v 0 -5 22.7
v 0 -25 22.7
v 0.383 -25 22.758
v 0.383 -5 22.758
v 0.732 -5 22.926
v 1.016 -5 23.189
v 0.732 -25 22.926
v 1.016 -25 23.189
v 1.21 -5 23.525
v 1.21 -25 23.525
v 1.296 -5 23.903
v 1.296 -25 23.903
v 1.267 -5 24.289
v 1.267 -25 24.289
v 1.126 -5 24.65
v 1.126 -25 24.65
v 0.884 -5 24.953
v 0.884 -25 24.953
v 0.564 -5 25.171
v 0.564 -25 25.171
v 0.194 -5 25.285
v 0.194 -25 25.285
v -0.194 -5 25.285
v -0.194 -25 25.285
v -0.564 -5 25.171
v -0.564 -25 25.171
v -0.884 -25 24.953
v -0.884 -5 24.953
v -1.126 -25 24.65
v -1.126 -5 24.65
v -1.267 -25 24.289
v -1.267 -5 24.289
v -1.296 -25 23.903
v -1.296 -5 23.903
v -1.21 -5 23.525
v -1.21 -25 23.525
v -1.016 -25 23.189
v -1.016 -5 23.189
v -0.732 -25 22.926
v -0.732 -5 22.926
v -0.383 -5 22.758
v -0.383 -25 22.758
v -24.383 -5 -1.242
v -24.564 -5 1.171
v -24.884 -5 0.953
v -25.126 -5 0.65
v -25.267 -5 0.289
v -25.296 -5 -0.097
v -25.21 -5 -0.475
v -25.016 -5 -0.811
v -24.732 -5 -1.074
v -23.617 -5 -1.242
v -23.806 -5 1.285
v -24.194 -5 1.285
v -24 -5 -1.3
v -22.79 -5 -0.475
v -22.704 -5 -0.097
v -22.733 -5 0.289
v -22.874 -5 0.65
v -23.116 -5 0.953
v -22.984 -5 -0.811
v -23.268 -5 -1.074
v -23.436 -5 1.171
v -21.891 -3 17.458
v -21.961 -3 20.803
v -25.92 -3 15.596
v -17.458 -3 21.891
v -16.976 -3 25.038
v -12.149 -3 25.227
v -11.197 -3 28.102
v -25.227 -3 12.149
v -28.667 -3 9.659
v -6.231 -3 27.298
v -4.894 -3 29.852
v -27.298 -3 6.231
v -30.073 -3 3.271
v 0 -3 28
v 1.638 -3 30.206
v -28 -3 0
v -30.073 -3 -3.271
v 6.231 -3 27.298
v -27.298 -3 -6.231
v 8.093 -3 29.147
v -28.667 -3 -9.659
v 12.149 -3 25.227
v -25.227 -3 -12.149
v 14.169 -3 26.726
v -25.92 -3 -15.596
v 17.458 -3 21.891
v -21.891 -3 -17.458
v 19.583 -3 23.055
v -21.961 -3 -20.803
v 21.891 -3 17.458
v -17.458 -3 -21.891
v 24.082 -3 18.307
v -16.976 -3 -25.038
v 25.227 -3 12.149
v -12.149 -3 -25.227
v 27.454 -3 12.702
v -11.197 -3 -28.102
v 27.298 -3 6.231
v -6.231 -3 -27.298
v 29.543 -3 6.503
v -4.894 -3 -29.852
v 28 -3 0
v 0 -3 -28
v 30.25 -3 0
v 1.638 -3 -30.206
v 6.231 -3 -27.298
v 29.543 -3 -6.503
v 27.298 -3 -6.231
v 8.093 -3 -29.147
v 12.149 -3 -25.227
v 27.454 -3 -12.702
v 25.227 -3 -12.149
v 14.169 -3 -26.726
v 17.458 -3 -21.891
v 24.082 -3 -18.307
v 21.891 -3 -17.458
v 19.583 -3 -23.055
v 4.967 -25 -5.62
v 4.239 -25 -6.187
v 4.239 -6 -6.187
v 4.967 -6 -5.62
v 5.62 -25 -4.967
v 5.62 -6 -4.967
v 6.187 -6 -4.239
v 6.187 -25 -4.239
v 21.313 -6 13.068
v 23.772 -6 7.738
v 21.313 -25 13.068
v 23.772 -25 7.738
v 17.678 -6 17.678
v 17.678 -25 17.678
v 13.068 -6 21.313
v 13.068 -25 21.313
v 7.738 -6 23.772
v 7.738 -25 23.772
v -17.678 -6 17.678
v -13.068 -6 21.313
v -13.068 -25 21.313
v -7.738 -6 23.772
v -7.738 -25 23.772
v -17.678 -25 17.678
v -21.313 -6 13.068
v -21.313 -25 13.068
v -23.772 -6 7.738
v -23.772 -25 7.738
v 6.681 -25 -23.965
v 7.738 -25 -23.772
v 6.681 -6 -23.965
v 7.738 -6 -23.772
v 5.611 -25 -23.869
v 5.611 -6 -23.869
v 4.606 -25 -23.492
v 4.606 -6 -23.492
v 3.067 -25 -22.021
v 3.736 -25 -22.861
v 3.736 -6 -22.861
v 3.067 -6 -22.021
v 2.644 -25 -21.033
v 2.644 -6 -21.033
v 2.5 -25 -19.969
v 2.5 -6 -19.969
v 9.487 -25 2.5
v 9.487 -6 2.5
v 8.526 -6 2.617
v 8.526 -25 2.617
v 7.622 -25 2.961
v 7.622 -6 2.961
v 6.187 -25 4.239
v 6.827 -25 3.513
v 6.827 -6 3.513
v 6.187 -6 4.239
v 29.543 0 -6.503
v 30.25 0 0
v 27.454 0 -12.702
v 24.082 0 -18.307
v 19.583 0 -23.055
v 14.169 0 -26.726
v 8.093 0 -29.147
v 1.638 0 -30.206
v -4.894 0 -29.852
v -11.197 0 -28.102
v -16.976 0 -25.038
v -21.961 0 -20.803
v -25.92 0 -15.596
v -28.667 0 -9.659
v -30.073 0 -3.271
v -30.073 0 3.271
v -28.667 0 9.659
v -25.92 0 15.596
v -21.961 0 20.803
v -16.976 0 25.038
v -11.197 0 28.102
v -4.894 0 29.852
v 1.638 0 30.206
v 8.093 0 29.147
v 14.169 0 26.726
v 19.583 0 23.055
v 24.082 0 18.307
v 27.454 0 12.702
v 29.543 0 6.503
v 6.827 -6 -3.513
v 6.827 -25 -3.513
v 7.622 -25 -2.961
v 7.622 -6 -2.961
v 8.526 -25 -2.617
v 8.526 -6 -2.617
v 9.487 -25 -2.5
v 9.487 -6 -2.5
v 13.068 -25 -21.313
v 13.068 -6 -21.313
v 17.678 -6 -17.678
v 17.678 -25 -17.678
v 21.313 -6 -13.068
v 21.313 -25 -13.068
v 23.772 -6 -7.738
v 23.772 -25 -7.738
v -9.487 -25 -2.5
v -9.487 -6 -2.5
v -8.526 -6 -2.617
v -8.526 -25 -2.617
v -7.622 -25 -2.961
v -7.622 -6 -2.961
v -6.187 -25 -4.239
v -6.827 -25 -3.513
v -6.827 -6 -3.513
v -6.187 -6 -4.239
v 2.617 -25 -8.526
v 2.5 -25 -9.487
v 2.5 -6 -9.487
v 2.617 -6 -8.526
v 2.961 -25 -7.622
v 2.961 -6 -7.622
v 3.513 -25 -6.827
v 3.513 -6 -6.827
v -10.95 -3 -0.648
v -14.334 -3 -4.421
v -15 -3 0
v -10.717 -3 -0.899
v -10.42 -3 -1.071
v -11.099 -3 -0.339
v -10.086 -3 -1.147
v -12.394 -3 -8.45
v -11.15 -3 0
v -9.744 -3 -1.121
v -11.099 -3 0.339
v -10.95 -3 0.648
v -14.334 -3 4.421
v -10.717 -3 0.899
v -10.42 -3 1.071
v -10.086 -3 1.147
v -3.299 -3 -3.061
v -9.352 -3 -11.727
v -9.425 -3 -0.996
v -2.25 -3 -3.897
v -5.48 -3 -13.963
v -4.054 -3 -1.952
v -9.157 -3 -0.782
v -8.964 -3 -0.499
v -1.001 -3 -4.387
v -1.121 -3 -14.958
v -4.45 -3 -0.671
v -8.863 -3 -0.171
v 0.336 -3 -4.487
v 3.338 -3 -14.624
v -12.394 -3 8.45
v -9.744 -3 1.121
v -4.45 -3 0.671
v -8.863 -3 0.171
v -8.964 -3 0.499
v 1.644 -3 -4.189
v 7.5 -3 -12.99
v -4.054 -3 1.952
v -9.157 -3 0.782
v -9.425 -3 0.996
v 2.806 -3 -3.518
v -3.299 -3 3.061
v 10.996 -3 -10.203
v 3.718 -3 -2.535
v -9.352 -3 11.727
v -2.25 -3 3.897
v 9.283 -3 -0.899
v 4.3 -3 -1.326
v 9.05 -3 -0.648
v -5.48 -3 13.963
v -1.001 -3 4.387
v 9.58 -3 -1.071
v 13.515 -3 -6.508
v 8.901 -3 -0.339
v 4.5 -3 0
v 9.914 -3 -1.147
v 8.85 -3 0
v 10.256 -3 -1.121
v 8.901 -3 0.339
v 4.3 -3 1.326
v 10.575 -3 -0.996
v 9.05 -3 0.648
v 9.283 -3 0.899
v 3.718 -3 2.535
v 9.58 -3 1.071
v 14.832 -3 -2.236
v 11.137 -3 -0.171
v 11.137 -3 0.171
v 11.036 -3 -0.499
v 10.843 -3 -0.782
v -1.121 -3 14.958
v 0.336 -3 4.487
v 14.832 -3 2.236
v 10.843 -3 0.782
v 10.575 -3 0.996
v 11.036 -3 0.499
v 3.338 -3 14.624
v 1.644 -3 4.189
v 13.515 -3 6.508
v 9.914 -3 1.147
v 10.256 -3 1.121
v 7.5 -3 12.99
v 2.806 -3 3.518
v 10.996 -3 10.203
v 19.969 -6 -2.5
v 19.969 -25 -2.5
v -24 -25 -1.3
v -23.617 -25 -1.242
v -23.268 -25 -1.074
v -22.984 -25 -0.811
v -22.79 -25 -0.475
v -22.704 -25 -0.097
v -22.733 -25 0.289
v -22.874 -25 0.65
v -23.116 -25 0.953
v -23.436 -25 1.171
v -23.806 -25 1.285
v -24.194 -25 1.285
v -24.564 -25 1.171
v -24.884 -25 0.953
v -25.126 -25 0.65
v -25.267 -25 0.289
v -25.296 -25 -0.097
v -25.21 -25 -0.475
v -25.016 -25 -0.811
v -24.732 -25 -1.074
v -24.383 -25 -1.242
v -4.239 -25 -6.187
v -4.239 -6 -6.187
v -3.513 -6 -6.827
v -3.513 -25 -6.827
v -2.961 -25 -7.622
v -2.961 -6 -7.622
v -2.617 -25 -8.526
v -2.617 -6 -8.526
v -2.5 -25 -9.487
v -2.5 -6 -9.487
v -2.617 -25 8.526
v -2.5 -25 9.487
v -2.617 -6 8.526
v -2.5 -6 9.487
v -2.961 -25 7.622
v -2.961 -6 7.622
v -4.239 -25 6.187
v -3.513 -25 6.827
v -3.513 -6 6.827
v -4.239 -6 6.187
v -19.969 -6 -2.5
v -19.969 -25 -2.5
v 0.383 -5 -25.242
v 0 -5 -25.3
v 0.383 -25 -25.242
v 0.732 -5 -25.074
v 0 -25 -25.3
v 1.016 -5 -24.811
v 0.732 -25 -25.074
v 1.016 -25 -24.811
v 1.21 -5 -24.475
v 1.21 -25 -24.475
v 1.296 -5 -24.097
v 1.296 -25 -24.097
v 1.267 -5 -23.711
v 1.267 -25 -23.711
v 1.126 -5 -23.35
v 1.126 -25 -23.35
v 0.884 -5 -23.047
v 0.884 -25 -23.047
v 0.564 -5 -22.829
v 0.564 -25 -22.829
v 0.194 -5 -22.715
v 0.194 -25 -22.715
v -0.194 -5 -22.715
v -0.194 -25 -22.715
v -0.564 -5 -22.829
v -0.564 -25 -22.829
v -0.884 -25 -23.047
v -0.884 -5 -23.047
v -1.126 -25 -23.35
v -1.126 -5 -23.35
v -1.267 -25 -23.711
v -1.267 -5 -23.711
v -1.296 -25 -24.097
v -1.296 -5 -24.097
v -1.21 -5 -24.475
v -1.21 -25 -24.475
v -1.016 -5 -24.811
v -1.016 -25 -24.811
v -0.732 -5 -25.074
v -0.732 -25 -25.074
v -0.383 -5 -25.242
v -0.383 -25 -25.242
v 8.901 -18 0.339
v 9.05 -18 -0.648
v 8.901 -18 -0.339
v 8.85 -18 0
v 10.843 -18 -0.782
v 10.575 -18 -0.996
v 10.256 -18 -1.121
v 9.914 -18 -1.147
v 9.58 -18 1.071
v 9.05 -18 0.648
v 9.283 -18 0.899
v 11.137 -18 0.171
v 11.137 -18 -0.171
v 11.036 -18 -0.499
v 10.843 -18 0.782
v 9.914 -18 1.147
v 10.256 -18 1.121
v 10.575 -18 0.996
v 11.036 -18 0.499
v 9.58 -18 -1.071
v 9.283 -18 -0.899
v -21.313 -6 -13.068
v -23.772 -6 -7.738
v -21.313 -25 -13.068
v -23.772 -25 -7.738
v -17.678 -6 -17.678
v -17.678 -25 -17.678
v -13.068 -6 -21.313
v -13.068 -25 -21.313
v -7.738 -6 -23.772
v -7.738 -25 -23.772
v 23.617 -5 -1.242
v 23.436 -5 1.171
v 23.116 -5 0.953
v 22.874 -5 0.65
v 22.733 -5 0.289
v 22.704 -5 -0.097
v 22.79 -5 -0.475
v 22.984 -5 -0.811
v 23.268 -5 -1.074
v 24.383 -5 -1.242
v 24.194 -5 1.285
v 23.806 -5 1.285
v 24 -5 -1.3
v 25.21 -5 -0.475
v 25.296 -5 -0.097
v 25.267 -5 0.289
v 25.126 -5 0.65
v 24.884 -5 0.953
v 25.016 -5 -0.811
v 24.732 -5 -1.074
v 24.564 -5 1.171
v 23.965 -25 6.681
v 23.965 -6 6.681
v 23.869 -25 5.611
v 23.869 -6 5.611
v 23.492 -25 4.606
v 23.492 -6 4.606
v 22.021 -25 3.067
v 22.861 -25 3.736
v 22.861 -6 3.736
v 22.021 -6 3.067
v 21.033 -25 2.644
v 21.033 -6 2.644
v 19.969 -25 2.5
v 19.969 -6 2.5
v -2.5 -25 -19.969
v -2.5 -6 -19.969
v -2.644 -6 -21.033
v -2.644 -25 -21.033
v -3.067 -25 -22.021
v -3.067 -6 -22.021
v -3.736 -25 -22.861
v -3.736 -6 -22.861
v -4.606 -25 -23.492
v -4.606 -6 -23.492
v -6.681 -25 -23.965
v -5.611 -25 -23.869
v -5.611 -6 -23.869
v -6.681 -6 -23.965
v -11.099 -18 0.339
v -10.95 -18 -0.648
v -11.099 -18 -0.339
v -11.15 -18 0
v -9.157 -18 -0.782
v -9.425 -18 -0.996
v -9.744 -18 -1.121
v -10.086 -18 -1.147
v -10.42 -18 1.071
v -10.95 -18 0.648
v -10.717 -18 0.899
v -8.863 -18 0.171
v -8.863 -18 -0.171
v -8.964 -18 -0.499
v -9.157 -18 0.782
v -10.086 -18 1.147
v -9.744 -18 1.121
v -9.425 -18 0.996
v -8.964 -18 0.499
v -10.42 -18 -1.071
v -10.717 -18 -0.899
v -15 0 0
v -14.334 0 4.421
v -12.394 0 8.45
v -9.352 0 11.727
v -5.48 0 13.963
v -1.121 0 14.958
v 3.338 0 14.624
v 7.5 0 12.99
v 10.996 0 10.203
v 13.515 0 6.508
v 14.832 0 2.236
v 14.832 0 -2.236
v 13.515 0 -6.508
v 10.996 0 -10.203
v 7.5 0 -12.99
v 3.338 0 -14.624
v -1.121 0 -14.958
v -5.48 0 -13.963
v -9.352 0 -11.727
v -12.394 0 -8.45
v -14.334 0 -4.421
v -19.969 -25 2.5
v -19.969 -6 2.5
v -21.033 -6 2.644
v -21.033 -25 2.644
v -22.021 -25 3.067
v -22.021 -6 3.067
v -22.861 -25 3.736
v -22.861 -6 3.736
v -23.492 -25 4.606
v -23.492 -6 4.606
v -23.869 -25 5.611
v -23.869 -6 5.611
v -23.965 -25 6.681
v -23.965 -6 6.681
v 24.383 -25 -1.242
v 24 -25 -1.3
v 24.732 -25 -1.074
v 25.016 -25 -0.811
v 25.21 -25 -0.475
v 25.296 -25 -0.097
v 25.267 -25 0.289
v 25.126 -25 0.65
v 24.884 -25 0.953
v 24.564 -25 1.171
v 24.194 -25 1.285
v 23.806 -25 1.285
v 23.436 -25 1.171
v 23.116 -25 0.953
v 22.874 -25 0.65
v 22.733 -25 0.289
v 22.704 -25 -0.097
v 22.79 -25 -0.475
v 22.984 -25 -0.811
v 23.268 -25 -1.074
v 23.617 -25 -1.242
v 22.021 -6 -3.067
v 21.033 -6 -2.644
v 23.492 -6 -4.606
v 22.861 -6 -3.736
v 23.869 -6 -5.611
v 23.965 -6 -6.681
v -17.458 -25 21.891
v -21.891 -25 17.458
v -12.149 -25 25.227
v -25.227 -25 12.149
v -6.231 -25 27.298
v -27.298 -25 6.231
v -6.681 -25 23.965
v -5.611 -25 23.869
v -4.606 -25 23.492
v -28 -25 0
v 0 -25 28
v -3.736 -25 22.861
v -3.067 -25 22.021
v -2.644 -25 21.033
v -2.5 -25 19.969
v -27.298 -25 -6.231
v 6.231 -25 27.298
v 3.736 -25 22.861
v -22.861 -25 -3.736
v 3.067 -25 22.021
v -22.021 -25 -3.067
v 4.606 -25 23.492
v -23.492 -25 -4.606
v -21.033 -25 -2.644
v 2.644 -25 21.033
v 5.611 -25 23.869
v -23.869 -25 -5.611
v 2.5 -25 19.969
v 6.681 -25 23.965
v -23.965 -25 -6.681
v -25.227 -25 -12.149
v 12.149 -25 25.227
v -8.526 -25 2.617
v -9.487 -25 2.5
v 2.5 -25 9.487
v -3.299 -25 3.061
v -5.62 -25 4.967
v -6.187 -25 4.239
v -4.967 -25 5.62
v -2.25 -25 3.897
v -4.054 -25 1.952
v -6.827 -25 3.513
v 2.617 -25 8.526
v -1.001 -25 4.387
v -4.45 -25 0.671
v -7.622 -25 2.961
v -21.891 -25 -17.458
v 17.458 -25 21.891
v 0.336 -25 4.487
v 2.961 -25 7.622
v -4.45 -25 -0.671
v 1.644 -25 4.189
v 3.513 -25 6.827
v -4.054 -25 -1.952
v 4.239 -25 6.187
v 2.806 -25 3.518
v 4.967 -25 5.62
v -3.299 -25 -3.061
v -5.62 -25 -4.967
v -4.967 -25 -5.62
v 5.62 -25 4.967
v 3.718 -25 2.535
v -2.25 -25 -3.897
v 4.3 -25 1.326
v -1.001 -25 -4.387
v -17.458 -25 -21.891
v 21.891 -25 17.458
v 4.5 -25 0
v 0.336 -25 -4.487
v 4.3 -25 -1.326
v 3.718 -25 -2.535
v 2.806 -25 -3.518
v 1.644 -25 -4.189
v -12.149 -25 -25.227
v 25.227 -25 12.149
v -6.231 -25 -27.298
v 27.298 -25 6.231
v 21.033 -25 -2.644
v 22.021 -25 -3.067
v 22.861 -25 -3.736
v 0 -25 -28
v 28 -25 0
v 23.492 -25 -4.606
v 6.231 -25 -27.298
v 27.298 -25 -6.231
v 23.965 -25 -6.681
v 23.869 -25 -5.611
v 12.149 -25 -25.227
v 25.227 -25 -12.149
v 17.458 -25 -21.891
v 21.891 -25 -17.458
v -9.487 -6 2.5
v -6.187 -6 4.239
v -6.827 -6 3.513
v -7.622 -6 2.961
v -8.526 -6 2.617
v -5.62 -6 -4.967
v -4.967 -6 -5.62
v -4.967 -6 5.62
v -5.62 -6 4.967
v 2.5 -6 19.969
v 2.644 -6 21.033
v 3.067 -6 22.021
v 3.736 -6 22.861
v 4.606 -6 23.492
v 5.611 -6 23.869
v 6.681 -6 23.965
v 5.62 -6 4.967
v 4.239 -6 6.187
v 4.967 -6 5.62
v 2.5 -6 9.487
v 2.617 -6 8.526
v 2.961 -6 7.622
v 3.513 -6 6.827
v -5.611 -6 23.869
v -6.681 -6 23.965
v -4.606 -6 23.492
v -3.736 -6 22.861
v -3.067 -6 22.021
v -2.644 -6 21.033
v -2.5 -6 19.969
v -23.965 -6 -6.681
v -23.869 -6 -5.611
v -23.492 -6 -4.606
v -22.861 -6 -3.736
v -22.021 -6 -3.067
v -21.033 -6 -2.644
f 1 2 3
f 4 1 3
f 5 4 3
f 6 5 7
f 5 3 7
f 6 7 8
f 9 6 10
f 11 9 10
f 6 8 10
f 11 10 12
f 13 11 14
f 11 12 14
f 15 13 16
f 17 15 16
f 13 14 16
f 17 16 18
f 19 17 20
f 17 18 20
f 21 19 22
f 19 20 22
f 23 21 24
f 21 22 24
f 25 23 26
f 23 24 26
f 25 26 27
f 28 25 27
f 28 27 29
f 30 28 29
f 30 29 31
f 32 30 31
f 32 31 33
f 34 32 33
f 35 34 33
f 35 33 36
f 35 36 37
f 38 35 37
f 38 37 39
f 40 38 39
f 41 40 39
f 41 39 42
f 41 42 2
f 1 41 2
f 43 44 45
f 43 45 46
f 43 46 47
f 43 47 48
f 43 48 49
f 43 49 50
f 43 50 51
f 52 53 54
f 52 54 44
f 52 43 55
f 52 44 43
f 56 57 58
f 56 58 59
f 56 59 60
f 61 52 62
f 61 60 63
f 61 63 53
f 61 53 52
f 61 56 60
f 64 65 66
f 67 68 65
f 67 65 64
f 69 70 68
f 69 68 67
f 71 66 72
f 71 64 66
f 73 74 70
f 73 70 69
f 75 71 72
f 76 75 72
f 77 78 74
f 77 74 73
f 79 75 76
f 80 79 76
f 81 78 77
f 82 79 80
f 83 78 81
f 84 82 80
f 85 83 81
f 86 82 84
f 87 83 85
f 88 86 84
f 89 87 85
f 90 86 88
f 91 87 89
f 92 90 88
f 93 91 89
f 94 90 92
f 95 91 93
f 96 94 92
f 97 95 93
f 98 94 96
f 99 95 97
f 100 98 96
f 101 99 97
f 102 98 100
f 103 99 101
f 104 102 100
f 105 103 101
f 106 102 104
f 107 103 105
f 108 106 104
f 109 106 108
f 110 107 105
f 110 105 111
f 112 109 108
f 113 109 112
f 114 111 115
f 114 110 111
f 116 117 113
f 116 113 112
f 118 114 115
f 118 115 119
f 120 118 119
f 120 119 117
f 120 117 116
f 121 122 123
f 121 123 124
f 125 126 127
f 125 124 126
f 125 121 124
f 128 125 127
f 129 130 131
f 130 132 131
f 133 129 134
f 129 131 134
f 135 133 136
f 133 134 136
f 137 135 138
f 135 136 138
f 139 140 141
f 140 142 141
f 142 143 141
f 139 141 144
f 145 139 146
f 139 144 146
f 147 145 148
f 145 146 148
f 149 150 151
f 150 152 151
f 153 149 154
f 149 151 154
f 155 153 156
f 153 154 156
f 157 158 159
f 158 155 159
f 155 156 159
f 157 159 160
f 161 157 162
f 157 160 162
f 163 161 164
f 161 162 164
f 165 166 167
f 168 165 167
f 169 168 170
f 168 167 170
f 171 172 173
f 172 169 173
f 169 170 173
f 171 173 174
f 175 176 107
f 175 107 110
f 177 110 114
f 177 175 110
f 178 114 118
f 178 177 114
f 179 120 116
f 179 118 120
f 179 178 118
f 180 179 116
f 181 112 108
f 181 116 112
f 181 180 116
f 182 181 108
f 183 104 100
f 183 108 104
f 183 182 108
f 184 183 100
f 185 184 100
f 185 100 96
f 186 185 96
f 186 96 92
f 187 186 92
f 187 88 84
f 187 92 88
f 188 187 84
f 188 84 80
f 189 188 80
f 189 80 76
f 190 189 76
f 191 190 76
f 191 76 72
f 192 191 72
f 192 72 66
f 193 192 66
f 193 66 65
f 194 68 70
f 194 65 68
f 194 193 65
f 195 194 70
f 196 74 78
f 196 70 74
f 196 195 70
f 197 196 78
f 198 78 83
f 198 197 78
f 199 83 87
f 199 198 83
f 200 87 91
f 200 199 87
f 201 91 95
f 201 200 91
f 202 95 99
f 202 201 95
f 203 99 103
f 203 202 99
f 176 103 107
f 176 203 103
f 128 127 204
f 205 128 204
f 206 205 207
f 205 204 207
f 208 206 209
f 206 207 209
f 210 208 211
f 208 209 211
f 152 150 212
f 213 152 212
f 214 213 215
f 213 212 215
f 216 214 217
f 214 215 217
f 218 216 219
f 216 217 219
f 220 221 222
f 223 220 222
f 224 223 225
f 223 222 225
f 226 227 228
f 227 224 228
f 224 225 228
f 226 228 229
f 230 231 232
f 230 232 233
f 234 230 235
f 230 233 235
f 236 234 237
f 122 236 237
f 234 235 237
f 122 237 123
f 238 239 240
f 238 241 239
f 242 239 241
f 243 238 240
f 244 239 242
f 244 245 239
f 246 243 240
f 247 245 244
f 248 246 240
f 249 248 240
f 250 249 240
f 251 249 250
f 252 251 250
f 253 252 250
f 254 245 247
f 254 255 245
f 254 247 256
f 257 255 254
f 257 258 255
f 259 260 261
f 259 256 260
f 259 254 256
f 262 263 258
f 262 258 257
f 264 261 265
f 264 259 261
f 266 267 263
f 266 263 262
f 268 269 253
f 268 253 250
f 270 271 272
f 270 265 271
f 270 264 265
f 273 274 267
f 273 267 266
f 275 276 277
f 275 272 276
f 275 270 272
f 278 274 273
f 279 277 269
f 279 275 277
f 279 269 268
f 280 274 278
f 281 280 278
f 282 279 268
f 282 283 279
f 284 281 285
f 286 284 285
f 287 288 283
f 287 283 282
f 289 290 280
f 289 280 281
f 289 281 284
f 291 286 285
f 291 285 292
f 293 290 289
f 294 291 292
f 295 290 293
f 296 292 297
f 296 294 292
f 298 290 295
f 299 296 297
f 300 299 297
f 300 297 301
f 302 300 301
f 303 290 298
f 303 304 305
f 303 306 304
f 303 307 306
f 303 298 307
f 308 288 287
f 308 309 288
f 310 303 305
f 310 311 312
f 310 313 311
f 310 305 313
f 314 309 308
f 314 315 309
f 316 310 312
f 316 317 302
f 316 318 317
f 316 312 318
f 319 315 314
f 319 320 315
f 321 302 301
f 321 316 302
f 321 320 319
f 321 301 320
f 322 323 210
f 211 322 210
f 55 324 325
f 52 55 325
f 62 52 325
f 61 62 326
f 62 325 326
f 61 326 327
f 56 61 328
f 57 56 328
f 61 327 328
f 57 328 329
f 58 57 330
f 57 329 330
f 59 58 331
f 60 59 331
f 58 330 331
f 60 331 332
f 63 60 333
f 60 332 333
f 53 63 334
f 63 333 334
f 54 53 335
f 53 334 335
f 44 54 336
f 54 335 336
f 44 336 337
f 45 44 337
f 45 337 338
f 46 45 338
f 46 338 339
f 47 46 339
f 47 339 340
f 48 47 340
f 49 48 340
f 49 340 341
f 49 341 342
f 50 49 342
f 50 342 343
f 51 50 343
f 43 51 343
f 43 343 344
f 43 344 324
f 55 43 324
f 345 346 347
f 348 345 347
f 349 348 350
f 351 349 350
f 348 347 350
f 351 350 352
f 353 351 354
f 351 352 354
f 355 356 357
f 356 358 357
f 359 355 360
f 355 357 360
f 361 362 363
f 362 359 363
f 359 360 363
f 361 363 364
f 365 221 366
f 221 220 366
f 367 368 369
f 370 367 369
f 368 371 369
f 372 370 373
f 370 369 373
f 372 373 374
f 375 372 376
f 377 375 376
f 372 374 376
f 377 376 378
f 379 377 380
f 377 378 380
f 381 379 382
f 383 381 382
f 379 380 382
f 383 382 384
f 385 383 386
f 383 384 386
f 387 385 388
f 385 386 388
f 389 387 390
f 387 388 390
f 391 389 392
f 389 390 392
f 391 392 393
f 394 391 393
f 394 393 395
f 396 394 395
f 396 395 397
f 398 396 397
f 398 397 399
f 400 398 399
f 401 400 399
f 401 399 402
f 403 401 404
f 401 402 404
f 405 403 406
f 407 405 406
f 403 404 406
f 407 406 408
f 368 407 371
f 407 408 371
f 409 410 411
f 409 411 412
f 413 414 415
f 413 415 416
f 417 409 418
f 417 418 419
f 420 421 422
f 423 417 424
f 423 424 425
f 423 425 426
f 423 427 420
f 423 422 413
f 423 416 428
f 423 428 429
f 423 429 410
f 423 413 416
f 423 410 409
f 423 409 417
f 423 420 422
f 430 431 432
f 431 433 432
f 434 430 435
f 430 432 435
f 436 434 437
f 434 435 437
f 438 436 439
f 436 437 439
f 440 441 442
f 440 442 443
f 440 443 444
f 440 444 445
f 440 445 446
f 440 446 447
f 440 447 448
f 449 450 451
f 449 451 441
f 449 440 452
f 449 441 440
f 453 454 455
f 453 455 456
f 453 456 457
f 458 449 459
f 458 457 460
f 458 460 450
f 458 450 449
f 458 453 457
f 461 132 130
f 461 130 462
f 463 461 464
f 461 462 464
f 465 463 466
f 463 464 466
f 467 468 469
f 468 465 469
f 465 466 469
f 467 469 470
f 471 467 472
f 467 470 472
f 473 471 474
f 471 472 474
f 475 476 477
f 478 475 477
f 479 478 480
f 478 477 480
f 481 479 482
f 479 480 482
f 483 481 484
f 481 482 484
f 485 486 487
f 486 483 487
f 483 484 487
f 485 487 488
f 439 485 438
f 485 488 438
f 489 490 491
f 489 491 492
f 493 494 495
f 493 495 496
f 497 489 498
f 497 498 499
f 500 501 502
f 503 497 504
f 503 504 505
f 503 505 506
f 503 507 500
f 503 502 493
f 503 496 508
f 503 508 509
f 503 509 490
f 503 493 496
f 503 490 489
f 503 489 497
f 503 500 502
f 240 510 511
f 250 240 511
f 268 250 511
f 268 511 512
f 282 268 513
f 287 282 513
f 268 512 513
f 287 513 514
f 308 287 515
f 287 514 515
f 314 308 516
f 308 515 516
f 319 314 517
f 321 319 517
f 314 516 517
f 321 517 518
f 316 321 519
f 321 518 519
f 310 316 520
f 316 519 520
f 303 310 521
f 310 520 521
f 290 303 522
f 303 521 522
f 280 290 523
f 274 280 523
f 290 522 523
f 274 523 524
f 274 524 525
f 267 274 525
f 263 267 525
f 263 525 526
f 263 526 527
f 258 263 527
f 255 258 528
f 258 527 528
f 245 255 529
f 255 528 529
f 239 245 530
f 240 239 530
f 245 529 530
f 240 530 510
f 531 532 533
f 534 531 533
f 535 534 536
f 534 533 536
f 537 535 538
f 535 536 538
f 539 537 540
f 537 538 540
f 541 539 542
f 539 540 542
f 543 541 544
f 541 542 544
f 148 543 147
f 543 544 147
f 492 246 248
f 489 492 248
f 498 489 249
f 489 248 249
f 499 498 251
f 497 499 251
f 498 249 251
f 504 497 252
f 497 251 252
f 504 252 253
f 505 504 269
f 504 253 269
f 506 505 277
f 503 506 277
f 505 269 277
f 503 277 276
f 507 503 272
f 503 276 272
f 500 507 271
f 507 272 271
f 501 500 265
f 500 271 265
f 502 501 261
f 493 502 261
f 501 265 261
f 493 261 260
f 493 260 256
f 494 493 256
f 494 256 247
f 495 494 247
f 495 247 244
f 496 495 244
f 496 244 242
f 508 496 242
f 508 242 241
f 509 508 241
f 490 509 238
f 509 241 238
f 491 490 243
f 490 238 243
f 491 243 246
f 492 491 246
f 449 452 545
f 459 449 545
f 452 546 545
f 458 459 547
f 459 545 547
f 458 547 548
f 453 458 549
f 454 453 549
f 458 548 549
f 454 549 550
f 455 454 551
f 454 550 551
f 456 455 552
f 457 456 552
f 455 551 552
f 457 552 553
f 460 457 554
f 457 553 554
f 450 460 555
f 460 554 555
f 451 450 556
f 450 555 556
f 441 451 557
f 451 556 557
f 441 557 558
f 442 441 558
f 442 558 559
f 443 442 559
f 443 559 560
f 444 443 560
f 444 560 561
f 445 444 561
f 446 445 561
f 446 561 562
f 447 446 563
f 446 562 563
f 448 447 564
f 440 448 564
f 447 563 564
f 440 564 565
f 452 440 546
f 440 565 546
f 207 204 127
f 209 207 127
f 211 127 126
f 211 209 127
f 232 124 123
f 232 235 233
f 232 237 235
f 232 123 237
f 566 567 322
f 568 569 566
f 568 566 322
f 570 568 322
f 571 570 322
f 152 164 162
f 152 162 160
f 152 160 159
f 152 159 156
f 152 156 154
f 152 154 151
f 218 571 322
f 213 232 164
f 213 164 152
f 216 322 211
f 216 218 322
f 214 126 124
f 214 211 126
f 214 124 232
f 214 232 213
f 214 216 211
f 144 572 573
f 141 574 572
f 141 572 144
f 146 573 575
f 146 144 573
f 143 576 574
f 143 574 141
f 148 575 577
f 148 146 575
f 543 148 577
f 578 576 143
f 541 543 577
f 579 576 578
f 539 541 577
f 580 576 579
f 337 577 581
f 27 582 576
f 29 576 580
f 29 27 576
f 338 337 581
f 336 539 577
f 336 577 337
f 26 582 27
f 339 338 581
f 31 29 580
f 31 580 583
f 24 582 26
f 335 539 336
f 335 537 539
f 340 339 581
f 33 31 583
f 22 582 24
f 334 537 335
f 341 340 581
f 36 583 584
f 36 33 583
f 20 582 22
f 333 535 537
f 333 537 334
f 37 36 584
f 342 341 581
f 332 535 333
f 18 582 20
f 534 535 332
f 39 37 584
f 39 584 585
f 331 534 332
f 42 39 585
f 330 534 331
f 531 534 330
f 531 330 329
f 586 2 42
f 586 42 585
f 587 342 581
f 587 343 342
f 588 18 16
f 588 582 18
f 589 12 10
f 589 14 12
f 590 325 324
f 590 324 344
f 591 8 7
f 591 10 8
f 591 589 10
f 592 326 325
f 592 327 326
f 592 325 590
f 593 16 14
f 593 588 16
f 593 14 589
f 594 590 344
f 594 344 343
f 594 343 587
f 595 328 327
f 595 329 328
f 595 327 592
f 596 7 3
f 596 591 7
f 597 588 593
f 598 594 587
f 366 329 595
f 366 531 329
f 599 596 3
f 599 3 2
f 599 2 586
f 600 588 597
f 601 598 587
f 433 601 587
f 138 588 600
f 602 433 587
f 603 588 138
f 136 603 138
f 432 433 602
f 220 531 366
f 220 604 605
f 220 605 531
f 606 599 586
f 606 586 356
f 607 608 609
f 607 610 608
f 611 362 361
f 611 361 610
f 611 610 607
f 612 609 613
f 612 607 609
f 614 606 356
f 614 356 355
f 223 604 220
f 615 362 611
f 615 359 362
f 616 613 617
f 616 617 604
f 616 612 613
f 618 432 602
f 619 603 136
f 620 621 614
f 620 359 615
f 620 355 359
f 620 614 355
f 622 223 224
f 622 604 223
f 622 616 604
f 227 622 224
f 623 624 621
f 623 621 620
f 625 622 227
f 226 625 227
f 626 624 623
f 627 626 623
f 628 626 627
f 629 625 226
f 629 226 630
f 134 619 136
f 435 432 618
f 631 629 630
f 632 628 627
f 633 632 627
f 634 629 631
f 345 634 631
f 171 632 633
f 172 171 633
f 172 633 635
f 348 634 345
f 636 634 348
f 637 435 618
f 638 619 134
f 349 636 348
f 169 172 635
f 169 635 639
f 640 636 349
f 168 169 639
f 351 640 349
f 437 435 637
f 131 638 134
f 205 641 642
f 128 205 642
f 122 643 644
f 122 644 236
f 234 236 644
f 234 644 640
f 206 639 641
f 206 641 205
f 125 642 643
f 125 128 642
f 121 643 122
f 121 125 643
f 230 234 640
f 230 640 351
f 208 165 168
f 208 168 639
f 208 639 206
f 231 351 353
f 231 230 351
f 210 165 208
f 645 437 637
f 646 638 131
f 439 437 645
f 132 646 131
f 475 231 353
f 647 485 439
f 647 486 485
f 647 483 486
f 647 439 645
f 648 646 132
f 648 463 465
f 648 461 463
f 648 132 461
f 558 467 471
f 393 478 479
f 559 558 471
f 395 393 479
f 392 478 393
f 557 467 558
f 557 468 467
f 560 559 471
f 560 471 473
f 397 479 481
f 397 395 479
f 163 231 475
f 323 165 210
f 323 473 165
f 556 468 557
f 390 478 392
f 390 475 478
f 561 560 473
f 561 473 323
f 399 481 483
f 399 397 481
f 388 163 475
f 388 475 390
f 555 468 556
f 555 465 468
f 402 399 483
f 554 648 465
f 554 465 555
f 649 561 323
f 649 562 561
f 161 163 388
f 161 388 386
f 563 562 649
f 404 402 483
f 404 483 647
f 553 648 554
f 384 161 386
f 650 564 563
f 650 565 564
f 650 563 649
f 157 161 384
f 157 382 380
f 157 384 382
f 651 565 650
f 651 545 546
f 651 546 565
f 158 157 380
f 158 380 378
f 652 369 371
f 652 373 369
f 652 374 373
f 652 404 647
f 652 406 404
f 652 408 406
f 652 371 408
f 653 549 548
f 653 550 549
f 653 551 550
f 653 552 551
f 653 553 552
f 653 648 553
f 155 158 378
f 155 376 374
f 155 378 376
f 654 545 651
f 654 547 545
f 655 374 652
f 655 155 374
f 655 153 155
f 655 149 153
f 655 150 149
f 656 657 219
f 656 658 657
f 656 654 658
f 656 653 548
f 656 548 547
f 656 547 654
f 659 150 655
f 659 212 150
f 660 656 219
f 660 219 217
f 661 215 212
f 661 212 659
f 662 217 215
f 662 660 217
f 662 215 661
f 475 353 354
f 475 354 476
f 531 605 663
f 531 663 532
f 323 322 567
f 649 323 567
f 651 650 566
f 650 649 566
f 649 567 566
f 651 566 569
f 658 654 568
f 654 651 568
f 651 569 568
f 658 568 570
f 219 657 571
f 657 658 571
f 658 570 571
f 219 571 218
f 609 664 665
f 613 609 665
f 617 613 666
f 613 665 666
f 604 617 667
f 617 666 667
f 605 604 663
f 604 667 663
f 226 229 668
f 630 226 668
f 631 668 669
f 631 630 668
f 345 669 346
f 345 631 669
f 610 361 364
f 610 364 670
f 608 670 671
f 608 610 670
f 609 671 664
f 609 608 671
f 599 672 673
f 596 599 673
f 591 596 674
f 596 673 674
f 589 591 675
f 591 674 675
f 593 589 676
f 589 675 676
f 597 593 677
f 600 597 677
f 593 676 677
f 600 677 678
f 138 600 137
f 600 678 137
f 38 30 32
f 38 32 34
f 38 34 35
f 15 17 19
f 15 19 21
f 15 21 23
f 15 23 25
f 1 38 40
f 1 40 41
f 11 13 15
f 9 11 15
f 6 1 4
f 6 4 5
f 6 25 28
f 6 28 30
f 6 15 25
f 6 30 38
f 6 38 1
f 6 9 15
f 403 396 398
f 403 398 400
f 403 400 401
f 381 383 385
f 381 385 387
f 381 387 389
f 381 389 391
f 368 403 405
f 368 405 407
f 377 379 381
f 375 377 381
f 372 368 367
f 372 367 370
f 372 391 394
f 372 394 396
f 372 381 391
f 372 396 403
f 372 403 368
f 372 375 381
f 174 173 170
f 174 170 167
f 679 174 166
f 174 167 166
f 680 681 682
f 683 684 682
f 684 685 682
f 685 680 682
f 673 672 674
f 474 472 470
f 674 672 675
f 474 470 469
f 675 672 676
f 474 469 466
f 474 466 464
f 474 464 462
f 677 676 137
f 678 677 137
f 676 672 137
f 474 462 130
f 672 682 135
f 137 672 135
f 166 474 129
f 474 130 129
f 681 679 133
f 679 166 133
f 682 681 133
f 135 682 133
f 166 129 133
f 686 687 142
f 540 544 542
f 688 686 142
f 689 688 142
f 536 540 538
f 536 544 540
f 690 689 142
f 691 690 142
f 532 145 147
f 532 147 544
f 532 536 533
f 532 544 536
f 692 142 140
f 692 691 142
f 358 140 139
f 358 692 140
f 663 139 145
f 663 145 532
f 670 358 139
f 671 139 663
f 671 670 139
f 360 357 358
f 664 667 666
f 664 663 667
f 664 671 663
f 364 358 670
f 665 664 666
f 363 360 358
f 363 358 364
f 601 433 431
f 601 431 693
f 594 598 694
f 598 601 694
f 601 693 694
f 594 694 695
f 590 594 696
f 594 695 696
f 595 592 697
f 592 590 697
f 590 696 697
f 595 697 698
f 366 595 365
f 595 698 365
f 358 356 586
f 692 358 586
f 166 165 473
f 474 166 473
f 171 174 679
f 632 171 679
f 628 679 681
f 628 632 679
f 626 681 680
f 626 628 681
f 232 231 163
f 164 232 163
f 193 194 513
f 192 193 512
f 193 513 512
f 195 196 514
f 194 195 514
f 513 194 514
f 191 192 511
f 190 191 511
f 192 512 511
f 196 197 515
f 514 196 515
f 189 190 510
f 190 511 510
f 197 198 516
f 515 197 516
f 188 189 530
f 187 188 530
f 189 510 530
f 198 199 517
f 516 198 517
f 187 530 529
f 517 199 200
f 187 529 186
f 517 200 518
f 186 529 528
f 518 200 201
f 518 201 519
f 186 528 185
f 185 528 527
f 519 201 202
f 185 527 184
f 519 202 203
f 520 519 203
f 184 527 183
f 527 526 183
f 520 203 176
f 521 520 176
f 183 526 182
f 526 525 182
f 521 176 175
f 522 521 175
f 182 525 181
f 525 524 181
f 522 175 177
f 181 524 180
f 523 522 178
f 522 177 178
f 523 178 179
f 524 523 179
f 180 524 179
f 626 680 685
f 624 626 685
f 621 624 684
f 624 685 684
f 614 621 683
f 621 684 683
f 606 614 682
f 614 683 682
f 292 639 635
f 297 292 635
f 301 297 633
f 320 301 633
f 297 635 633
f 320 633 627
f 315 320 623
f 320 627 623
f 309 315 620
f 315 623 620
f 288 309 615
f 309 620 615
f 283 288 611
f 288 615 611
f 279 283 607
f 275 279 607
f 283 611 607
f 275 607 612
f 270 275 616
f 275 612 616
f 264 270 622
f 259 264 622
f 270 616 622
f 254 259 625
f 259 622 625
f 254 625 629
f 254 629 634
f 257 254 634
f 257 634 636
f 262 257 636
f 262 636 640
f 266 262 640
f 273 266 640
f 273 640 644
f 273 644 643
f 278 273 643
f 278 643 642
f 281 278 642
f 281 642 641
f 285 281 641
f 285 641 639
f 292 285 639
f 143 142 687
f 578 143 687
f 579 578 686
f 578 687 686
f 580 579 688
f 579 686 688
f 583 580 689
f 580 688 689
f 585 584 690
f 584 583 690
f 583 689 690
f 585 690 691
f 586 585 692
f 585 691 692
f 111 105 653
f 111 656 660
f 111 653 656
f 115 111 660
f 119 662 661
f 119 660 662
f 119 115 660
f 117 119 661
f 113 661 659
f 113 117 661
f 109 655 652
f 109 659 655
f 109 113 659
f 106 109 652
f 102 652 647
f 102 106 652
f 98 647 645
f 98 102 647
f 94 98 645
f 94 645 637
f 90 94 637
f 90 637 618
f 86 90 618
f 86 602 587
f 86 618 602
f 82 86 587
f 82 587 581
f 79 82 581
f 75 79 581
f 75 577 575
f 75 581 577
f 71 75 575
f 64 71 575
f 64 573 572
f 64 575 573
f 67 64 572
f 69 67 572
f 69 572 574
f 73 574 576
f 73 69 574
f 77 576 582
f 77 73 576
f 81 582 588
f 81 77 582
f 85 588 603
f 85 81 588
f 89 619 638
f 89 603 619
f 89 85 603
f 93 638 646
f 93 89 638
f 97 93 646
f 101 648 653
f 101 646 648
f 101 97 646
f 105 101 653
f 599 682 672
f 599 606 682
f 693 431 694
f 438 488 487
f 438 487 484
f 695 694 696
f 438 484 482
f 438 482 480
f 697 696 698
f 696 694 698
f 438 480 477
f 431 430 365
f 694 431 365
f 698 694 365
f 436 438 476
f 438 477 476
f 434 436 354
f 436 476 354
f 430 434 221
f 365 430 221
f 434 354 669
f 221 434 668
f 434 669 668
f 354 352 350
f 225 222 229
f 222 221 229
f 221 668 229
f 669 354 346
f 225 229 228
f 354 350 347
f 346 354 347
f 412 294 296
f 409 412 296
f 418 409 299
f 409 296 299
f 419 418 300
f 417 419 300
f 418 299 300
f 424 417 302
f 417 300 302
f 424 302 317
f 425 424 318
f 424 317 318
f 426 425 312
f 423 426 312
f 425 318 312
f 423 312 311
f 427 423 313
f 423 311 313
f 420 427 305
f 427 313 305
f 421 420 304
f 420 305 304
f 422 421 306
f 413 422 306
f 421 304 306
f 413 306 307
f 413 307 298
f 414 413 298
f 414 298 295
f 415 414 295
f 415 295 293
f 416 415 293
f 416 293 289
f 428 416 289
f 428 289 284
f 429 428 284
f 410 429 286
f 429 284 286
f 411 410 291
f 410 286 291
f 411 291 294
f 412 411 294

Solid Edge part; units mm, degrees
sketch "Sketch1" plane through (0, 0, 0) normal (0, -1, 0) x (1, 0, 0)
  circle A0 centre (0, 0) radius 30.25
extrude "Protrusion1" add sketch "Sketch1" along normal blind 3
sketch "Sketch2" plane through (0, -3, 0) normal (0, -1, 0) x (1, 0, 0)
  circle A0 centre (0, 0) radius 28
extrude "ExtrudedProtrusion_2" add sketch "Sketch2" along normal blind 22
sketch "Sketch3" plane through (0, 0, 0) normal (0, 1, 0) x (-1, 0, 0)
  circle A0 centre (0, 0) radius 15
extrude "ExtrudedCutout_1" cut sketch "Sketch3" against normal blind 3 and the other way up to next
sketch "Sketch4" plane through (0, -25, 0) normal (0, -1, 0) x (1, 0, 0)
  circle A0 centre (0, 0) radius 4.5
extrude "Cutout1" cut sketch "Sketch4" against normal through all and the other way up to next
sketch "Sketch5" plane through (0, -3, 0) normal (0, 1, 0) x (-1, 0, 0)
  circle A0 centre (-10, 0) radius 1.15
  circle A1 centre (10, 0) radius 1.15
  dimension "D1" = 2.3
  dimension "D2" = 2.3
  dimension "D3" = 10
  dimension "D4" = 10
extrude "ExtrudedCutout_3" cut sketch "Sketch5" against normal blind 15 and the other way up to next
sketch "Sketch6" plane through (0, -25, 0) normal (0, -1, 0) x (0, 0, -1)
  arc A0 (-24.8747, 2.5) -> (-2.5, 24.8747) centre (0, 0) cw
  line L0 (-2.5, 7.0711) -> (-2.5, 24.8747)
  arc A1 (-7.0711, 2.5) -> (-2.5, 7.0711) centre (0, 0) cw
  line L1 (-7.0711, 2.5) -> (-24.8747, 2.5)
  line L2 (7.0711, 2.5) -> (24.8747, 2.5)
  line L3 (2.5, 24.8747) -> (2.5, 7.0711)
  arc A2 (2.5, 24.8747) -> (24.8747, 2.5) centre (0, 0) cw
  arc A3 (2.5, 7.0711) -> (7.0711, 2.5) centre (0, 0) cw
  line L4 (7.0711, -2.5) -> (24.8747, -2.5)
  arc A4 (24.8747, -2.5) -> (2.5, -24.8747) centre (0, 0) cw
  line L5 (2.5, -7.0711) -> (2.5, -24.8747)
  arc A5 (7.0711, -2.5) -> (2.5, -7.0711) centre (0, 0) cw
  arc A6 (-2.5, -7.0711) -> (-7.0711, -2.5) centre (0, 0) cw
  line L6 (-7.0711, -2.5) -> (-24.8747, -2.5)
  arc A7 (-2.5, -24.8747) -> (-24.8747, -2.5) centre (0, 0) cw
  line L7 (-2.5, -7.0711) -> (-2.5, -24.8747)
extrude "ExtrudedCutout_4" cut sketch "Sketch6" against normal blind 19 and the other way up to next
fillet "Round_1" radius 4 16 edges at (2.5, -15.5, 24.8747) (-2.5, -15.5, 24.8747) (2.5, -15.5, 7.0711) (7.0711, -15.5, 2.5) (24.8747, -15.5, 2.5) (24.8747, -15.5, -2.5) (7.0711, -15.5, -2.5) (2.5, -15.5, -7.0711) (2.5, -15.5, -24.8747) (-2.5, -15.5, -24.8747) (-2.5, -15.5, -7.0711) (-7.0711, -15.5, -2.5) (-2.5, -15.5, 7.0711) (-7.0711, -15.5, 2.5) (-24.8747, -15.5, 2.5) (-24.8747, -15.5, -2.5)
sketch "Sketch7" plane through (0, -25, 0) normal (0, -1, 0) x (0, 0, -1)
  circle A0 centre (0, 24) radius 1.3
  circle A1 centre (-24, 0) radius 1.3
  circle A2 centre (24, 0) radius 1.3
  circle A3 centre (0, -24) radius 1.3
  dimension "D1" = 2.6
  dimension "D2" = 24
  dimension "D3" = 24
  dimension "D4" = 24
  dimension "D5" = 24
extrude "ExtrudedCutout_5" cut sketch "Sketch7" against normal blind 20 and the other way up to next
